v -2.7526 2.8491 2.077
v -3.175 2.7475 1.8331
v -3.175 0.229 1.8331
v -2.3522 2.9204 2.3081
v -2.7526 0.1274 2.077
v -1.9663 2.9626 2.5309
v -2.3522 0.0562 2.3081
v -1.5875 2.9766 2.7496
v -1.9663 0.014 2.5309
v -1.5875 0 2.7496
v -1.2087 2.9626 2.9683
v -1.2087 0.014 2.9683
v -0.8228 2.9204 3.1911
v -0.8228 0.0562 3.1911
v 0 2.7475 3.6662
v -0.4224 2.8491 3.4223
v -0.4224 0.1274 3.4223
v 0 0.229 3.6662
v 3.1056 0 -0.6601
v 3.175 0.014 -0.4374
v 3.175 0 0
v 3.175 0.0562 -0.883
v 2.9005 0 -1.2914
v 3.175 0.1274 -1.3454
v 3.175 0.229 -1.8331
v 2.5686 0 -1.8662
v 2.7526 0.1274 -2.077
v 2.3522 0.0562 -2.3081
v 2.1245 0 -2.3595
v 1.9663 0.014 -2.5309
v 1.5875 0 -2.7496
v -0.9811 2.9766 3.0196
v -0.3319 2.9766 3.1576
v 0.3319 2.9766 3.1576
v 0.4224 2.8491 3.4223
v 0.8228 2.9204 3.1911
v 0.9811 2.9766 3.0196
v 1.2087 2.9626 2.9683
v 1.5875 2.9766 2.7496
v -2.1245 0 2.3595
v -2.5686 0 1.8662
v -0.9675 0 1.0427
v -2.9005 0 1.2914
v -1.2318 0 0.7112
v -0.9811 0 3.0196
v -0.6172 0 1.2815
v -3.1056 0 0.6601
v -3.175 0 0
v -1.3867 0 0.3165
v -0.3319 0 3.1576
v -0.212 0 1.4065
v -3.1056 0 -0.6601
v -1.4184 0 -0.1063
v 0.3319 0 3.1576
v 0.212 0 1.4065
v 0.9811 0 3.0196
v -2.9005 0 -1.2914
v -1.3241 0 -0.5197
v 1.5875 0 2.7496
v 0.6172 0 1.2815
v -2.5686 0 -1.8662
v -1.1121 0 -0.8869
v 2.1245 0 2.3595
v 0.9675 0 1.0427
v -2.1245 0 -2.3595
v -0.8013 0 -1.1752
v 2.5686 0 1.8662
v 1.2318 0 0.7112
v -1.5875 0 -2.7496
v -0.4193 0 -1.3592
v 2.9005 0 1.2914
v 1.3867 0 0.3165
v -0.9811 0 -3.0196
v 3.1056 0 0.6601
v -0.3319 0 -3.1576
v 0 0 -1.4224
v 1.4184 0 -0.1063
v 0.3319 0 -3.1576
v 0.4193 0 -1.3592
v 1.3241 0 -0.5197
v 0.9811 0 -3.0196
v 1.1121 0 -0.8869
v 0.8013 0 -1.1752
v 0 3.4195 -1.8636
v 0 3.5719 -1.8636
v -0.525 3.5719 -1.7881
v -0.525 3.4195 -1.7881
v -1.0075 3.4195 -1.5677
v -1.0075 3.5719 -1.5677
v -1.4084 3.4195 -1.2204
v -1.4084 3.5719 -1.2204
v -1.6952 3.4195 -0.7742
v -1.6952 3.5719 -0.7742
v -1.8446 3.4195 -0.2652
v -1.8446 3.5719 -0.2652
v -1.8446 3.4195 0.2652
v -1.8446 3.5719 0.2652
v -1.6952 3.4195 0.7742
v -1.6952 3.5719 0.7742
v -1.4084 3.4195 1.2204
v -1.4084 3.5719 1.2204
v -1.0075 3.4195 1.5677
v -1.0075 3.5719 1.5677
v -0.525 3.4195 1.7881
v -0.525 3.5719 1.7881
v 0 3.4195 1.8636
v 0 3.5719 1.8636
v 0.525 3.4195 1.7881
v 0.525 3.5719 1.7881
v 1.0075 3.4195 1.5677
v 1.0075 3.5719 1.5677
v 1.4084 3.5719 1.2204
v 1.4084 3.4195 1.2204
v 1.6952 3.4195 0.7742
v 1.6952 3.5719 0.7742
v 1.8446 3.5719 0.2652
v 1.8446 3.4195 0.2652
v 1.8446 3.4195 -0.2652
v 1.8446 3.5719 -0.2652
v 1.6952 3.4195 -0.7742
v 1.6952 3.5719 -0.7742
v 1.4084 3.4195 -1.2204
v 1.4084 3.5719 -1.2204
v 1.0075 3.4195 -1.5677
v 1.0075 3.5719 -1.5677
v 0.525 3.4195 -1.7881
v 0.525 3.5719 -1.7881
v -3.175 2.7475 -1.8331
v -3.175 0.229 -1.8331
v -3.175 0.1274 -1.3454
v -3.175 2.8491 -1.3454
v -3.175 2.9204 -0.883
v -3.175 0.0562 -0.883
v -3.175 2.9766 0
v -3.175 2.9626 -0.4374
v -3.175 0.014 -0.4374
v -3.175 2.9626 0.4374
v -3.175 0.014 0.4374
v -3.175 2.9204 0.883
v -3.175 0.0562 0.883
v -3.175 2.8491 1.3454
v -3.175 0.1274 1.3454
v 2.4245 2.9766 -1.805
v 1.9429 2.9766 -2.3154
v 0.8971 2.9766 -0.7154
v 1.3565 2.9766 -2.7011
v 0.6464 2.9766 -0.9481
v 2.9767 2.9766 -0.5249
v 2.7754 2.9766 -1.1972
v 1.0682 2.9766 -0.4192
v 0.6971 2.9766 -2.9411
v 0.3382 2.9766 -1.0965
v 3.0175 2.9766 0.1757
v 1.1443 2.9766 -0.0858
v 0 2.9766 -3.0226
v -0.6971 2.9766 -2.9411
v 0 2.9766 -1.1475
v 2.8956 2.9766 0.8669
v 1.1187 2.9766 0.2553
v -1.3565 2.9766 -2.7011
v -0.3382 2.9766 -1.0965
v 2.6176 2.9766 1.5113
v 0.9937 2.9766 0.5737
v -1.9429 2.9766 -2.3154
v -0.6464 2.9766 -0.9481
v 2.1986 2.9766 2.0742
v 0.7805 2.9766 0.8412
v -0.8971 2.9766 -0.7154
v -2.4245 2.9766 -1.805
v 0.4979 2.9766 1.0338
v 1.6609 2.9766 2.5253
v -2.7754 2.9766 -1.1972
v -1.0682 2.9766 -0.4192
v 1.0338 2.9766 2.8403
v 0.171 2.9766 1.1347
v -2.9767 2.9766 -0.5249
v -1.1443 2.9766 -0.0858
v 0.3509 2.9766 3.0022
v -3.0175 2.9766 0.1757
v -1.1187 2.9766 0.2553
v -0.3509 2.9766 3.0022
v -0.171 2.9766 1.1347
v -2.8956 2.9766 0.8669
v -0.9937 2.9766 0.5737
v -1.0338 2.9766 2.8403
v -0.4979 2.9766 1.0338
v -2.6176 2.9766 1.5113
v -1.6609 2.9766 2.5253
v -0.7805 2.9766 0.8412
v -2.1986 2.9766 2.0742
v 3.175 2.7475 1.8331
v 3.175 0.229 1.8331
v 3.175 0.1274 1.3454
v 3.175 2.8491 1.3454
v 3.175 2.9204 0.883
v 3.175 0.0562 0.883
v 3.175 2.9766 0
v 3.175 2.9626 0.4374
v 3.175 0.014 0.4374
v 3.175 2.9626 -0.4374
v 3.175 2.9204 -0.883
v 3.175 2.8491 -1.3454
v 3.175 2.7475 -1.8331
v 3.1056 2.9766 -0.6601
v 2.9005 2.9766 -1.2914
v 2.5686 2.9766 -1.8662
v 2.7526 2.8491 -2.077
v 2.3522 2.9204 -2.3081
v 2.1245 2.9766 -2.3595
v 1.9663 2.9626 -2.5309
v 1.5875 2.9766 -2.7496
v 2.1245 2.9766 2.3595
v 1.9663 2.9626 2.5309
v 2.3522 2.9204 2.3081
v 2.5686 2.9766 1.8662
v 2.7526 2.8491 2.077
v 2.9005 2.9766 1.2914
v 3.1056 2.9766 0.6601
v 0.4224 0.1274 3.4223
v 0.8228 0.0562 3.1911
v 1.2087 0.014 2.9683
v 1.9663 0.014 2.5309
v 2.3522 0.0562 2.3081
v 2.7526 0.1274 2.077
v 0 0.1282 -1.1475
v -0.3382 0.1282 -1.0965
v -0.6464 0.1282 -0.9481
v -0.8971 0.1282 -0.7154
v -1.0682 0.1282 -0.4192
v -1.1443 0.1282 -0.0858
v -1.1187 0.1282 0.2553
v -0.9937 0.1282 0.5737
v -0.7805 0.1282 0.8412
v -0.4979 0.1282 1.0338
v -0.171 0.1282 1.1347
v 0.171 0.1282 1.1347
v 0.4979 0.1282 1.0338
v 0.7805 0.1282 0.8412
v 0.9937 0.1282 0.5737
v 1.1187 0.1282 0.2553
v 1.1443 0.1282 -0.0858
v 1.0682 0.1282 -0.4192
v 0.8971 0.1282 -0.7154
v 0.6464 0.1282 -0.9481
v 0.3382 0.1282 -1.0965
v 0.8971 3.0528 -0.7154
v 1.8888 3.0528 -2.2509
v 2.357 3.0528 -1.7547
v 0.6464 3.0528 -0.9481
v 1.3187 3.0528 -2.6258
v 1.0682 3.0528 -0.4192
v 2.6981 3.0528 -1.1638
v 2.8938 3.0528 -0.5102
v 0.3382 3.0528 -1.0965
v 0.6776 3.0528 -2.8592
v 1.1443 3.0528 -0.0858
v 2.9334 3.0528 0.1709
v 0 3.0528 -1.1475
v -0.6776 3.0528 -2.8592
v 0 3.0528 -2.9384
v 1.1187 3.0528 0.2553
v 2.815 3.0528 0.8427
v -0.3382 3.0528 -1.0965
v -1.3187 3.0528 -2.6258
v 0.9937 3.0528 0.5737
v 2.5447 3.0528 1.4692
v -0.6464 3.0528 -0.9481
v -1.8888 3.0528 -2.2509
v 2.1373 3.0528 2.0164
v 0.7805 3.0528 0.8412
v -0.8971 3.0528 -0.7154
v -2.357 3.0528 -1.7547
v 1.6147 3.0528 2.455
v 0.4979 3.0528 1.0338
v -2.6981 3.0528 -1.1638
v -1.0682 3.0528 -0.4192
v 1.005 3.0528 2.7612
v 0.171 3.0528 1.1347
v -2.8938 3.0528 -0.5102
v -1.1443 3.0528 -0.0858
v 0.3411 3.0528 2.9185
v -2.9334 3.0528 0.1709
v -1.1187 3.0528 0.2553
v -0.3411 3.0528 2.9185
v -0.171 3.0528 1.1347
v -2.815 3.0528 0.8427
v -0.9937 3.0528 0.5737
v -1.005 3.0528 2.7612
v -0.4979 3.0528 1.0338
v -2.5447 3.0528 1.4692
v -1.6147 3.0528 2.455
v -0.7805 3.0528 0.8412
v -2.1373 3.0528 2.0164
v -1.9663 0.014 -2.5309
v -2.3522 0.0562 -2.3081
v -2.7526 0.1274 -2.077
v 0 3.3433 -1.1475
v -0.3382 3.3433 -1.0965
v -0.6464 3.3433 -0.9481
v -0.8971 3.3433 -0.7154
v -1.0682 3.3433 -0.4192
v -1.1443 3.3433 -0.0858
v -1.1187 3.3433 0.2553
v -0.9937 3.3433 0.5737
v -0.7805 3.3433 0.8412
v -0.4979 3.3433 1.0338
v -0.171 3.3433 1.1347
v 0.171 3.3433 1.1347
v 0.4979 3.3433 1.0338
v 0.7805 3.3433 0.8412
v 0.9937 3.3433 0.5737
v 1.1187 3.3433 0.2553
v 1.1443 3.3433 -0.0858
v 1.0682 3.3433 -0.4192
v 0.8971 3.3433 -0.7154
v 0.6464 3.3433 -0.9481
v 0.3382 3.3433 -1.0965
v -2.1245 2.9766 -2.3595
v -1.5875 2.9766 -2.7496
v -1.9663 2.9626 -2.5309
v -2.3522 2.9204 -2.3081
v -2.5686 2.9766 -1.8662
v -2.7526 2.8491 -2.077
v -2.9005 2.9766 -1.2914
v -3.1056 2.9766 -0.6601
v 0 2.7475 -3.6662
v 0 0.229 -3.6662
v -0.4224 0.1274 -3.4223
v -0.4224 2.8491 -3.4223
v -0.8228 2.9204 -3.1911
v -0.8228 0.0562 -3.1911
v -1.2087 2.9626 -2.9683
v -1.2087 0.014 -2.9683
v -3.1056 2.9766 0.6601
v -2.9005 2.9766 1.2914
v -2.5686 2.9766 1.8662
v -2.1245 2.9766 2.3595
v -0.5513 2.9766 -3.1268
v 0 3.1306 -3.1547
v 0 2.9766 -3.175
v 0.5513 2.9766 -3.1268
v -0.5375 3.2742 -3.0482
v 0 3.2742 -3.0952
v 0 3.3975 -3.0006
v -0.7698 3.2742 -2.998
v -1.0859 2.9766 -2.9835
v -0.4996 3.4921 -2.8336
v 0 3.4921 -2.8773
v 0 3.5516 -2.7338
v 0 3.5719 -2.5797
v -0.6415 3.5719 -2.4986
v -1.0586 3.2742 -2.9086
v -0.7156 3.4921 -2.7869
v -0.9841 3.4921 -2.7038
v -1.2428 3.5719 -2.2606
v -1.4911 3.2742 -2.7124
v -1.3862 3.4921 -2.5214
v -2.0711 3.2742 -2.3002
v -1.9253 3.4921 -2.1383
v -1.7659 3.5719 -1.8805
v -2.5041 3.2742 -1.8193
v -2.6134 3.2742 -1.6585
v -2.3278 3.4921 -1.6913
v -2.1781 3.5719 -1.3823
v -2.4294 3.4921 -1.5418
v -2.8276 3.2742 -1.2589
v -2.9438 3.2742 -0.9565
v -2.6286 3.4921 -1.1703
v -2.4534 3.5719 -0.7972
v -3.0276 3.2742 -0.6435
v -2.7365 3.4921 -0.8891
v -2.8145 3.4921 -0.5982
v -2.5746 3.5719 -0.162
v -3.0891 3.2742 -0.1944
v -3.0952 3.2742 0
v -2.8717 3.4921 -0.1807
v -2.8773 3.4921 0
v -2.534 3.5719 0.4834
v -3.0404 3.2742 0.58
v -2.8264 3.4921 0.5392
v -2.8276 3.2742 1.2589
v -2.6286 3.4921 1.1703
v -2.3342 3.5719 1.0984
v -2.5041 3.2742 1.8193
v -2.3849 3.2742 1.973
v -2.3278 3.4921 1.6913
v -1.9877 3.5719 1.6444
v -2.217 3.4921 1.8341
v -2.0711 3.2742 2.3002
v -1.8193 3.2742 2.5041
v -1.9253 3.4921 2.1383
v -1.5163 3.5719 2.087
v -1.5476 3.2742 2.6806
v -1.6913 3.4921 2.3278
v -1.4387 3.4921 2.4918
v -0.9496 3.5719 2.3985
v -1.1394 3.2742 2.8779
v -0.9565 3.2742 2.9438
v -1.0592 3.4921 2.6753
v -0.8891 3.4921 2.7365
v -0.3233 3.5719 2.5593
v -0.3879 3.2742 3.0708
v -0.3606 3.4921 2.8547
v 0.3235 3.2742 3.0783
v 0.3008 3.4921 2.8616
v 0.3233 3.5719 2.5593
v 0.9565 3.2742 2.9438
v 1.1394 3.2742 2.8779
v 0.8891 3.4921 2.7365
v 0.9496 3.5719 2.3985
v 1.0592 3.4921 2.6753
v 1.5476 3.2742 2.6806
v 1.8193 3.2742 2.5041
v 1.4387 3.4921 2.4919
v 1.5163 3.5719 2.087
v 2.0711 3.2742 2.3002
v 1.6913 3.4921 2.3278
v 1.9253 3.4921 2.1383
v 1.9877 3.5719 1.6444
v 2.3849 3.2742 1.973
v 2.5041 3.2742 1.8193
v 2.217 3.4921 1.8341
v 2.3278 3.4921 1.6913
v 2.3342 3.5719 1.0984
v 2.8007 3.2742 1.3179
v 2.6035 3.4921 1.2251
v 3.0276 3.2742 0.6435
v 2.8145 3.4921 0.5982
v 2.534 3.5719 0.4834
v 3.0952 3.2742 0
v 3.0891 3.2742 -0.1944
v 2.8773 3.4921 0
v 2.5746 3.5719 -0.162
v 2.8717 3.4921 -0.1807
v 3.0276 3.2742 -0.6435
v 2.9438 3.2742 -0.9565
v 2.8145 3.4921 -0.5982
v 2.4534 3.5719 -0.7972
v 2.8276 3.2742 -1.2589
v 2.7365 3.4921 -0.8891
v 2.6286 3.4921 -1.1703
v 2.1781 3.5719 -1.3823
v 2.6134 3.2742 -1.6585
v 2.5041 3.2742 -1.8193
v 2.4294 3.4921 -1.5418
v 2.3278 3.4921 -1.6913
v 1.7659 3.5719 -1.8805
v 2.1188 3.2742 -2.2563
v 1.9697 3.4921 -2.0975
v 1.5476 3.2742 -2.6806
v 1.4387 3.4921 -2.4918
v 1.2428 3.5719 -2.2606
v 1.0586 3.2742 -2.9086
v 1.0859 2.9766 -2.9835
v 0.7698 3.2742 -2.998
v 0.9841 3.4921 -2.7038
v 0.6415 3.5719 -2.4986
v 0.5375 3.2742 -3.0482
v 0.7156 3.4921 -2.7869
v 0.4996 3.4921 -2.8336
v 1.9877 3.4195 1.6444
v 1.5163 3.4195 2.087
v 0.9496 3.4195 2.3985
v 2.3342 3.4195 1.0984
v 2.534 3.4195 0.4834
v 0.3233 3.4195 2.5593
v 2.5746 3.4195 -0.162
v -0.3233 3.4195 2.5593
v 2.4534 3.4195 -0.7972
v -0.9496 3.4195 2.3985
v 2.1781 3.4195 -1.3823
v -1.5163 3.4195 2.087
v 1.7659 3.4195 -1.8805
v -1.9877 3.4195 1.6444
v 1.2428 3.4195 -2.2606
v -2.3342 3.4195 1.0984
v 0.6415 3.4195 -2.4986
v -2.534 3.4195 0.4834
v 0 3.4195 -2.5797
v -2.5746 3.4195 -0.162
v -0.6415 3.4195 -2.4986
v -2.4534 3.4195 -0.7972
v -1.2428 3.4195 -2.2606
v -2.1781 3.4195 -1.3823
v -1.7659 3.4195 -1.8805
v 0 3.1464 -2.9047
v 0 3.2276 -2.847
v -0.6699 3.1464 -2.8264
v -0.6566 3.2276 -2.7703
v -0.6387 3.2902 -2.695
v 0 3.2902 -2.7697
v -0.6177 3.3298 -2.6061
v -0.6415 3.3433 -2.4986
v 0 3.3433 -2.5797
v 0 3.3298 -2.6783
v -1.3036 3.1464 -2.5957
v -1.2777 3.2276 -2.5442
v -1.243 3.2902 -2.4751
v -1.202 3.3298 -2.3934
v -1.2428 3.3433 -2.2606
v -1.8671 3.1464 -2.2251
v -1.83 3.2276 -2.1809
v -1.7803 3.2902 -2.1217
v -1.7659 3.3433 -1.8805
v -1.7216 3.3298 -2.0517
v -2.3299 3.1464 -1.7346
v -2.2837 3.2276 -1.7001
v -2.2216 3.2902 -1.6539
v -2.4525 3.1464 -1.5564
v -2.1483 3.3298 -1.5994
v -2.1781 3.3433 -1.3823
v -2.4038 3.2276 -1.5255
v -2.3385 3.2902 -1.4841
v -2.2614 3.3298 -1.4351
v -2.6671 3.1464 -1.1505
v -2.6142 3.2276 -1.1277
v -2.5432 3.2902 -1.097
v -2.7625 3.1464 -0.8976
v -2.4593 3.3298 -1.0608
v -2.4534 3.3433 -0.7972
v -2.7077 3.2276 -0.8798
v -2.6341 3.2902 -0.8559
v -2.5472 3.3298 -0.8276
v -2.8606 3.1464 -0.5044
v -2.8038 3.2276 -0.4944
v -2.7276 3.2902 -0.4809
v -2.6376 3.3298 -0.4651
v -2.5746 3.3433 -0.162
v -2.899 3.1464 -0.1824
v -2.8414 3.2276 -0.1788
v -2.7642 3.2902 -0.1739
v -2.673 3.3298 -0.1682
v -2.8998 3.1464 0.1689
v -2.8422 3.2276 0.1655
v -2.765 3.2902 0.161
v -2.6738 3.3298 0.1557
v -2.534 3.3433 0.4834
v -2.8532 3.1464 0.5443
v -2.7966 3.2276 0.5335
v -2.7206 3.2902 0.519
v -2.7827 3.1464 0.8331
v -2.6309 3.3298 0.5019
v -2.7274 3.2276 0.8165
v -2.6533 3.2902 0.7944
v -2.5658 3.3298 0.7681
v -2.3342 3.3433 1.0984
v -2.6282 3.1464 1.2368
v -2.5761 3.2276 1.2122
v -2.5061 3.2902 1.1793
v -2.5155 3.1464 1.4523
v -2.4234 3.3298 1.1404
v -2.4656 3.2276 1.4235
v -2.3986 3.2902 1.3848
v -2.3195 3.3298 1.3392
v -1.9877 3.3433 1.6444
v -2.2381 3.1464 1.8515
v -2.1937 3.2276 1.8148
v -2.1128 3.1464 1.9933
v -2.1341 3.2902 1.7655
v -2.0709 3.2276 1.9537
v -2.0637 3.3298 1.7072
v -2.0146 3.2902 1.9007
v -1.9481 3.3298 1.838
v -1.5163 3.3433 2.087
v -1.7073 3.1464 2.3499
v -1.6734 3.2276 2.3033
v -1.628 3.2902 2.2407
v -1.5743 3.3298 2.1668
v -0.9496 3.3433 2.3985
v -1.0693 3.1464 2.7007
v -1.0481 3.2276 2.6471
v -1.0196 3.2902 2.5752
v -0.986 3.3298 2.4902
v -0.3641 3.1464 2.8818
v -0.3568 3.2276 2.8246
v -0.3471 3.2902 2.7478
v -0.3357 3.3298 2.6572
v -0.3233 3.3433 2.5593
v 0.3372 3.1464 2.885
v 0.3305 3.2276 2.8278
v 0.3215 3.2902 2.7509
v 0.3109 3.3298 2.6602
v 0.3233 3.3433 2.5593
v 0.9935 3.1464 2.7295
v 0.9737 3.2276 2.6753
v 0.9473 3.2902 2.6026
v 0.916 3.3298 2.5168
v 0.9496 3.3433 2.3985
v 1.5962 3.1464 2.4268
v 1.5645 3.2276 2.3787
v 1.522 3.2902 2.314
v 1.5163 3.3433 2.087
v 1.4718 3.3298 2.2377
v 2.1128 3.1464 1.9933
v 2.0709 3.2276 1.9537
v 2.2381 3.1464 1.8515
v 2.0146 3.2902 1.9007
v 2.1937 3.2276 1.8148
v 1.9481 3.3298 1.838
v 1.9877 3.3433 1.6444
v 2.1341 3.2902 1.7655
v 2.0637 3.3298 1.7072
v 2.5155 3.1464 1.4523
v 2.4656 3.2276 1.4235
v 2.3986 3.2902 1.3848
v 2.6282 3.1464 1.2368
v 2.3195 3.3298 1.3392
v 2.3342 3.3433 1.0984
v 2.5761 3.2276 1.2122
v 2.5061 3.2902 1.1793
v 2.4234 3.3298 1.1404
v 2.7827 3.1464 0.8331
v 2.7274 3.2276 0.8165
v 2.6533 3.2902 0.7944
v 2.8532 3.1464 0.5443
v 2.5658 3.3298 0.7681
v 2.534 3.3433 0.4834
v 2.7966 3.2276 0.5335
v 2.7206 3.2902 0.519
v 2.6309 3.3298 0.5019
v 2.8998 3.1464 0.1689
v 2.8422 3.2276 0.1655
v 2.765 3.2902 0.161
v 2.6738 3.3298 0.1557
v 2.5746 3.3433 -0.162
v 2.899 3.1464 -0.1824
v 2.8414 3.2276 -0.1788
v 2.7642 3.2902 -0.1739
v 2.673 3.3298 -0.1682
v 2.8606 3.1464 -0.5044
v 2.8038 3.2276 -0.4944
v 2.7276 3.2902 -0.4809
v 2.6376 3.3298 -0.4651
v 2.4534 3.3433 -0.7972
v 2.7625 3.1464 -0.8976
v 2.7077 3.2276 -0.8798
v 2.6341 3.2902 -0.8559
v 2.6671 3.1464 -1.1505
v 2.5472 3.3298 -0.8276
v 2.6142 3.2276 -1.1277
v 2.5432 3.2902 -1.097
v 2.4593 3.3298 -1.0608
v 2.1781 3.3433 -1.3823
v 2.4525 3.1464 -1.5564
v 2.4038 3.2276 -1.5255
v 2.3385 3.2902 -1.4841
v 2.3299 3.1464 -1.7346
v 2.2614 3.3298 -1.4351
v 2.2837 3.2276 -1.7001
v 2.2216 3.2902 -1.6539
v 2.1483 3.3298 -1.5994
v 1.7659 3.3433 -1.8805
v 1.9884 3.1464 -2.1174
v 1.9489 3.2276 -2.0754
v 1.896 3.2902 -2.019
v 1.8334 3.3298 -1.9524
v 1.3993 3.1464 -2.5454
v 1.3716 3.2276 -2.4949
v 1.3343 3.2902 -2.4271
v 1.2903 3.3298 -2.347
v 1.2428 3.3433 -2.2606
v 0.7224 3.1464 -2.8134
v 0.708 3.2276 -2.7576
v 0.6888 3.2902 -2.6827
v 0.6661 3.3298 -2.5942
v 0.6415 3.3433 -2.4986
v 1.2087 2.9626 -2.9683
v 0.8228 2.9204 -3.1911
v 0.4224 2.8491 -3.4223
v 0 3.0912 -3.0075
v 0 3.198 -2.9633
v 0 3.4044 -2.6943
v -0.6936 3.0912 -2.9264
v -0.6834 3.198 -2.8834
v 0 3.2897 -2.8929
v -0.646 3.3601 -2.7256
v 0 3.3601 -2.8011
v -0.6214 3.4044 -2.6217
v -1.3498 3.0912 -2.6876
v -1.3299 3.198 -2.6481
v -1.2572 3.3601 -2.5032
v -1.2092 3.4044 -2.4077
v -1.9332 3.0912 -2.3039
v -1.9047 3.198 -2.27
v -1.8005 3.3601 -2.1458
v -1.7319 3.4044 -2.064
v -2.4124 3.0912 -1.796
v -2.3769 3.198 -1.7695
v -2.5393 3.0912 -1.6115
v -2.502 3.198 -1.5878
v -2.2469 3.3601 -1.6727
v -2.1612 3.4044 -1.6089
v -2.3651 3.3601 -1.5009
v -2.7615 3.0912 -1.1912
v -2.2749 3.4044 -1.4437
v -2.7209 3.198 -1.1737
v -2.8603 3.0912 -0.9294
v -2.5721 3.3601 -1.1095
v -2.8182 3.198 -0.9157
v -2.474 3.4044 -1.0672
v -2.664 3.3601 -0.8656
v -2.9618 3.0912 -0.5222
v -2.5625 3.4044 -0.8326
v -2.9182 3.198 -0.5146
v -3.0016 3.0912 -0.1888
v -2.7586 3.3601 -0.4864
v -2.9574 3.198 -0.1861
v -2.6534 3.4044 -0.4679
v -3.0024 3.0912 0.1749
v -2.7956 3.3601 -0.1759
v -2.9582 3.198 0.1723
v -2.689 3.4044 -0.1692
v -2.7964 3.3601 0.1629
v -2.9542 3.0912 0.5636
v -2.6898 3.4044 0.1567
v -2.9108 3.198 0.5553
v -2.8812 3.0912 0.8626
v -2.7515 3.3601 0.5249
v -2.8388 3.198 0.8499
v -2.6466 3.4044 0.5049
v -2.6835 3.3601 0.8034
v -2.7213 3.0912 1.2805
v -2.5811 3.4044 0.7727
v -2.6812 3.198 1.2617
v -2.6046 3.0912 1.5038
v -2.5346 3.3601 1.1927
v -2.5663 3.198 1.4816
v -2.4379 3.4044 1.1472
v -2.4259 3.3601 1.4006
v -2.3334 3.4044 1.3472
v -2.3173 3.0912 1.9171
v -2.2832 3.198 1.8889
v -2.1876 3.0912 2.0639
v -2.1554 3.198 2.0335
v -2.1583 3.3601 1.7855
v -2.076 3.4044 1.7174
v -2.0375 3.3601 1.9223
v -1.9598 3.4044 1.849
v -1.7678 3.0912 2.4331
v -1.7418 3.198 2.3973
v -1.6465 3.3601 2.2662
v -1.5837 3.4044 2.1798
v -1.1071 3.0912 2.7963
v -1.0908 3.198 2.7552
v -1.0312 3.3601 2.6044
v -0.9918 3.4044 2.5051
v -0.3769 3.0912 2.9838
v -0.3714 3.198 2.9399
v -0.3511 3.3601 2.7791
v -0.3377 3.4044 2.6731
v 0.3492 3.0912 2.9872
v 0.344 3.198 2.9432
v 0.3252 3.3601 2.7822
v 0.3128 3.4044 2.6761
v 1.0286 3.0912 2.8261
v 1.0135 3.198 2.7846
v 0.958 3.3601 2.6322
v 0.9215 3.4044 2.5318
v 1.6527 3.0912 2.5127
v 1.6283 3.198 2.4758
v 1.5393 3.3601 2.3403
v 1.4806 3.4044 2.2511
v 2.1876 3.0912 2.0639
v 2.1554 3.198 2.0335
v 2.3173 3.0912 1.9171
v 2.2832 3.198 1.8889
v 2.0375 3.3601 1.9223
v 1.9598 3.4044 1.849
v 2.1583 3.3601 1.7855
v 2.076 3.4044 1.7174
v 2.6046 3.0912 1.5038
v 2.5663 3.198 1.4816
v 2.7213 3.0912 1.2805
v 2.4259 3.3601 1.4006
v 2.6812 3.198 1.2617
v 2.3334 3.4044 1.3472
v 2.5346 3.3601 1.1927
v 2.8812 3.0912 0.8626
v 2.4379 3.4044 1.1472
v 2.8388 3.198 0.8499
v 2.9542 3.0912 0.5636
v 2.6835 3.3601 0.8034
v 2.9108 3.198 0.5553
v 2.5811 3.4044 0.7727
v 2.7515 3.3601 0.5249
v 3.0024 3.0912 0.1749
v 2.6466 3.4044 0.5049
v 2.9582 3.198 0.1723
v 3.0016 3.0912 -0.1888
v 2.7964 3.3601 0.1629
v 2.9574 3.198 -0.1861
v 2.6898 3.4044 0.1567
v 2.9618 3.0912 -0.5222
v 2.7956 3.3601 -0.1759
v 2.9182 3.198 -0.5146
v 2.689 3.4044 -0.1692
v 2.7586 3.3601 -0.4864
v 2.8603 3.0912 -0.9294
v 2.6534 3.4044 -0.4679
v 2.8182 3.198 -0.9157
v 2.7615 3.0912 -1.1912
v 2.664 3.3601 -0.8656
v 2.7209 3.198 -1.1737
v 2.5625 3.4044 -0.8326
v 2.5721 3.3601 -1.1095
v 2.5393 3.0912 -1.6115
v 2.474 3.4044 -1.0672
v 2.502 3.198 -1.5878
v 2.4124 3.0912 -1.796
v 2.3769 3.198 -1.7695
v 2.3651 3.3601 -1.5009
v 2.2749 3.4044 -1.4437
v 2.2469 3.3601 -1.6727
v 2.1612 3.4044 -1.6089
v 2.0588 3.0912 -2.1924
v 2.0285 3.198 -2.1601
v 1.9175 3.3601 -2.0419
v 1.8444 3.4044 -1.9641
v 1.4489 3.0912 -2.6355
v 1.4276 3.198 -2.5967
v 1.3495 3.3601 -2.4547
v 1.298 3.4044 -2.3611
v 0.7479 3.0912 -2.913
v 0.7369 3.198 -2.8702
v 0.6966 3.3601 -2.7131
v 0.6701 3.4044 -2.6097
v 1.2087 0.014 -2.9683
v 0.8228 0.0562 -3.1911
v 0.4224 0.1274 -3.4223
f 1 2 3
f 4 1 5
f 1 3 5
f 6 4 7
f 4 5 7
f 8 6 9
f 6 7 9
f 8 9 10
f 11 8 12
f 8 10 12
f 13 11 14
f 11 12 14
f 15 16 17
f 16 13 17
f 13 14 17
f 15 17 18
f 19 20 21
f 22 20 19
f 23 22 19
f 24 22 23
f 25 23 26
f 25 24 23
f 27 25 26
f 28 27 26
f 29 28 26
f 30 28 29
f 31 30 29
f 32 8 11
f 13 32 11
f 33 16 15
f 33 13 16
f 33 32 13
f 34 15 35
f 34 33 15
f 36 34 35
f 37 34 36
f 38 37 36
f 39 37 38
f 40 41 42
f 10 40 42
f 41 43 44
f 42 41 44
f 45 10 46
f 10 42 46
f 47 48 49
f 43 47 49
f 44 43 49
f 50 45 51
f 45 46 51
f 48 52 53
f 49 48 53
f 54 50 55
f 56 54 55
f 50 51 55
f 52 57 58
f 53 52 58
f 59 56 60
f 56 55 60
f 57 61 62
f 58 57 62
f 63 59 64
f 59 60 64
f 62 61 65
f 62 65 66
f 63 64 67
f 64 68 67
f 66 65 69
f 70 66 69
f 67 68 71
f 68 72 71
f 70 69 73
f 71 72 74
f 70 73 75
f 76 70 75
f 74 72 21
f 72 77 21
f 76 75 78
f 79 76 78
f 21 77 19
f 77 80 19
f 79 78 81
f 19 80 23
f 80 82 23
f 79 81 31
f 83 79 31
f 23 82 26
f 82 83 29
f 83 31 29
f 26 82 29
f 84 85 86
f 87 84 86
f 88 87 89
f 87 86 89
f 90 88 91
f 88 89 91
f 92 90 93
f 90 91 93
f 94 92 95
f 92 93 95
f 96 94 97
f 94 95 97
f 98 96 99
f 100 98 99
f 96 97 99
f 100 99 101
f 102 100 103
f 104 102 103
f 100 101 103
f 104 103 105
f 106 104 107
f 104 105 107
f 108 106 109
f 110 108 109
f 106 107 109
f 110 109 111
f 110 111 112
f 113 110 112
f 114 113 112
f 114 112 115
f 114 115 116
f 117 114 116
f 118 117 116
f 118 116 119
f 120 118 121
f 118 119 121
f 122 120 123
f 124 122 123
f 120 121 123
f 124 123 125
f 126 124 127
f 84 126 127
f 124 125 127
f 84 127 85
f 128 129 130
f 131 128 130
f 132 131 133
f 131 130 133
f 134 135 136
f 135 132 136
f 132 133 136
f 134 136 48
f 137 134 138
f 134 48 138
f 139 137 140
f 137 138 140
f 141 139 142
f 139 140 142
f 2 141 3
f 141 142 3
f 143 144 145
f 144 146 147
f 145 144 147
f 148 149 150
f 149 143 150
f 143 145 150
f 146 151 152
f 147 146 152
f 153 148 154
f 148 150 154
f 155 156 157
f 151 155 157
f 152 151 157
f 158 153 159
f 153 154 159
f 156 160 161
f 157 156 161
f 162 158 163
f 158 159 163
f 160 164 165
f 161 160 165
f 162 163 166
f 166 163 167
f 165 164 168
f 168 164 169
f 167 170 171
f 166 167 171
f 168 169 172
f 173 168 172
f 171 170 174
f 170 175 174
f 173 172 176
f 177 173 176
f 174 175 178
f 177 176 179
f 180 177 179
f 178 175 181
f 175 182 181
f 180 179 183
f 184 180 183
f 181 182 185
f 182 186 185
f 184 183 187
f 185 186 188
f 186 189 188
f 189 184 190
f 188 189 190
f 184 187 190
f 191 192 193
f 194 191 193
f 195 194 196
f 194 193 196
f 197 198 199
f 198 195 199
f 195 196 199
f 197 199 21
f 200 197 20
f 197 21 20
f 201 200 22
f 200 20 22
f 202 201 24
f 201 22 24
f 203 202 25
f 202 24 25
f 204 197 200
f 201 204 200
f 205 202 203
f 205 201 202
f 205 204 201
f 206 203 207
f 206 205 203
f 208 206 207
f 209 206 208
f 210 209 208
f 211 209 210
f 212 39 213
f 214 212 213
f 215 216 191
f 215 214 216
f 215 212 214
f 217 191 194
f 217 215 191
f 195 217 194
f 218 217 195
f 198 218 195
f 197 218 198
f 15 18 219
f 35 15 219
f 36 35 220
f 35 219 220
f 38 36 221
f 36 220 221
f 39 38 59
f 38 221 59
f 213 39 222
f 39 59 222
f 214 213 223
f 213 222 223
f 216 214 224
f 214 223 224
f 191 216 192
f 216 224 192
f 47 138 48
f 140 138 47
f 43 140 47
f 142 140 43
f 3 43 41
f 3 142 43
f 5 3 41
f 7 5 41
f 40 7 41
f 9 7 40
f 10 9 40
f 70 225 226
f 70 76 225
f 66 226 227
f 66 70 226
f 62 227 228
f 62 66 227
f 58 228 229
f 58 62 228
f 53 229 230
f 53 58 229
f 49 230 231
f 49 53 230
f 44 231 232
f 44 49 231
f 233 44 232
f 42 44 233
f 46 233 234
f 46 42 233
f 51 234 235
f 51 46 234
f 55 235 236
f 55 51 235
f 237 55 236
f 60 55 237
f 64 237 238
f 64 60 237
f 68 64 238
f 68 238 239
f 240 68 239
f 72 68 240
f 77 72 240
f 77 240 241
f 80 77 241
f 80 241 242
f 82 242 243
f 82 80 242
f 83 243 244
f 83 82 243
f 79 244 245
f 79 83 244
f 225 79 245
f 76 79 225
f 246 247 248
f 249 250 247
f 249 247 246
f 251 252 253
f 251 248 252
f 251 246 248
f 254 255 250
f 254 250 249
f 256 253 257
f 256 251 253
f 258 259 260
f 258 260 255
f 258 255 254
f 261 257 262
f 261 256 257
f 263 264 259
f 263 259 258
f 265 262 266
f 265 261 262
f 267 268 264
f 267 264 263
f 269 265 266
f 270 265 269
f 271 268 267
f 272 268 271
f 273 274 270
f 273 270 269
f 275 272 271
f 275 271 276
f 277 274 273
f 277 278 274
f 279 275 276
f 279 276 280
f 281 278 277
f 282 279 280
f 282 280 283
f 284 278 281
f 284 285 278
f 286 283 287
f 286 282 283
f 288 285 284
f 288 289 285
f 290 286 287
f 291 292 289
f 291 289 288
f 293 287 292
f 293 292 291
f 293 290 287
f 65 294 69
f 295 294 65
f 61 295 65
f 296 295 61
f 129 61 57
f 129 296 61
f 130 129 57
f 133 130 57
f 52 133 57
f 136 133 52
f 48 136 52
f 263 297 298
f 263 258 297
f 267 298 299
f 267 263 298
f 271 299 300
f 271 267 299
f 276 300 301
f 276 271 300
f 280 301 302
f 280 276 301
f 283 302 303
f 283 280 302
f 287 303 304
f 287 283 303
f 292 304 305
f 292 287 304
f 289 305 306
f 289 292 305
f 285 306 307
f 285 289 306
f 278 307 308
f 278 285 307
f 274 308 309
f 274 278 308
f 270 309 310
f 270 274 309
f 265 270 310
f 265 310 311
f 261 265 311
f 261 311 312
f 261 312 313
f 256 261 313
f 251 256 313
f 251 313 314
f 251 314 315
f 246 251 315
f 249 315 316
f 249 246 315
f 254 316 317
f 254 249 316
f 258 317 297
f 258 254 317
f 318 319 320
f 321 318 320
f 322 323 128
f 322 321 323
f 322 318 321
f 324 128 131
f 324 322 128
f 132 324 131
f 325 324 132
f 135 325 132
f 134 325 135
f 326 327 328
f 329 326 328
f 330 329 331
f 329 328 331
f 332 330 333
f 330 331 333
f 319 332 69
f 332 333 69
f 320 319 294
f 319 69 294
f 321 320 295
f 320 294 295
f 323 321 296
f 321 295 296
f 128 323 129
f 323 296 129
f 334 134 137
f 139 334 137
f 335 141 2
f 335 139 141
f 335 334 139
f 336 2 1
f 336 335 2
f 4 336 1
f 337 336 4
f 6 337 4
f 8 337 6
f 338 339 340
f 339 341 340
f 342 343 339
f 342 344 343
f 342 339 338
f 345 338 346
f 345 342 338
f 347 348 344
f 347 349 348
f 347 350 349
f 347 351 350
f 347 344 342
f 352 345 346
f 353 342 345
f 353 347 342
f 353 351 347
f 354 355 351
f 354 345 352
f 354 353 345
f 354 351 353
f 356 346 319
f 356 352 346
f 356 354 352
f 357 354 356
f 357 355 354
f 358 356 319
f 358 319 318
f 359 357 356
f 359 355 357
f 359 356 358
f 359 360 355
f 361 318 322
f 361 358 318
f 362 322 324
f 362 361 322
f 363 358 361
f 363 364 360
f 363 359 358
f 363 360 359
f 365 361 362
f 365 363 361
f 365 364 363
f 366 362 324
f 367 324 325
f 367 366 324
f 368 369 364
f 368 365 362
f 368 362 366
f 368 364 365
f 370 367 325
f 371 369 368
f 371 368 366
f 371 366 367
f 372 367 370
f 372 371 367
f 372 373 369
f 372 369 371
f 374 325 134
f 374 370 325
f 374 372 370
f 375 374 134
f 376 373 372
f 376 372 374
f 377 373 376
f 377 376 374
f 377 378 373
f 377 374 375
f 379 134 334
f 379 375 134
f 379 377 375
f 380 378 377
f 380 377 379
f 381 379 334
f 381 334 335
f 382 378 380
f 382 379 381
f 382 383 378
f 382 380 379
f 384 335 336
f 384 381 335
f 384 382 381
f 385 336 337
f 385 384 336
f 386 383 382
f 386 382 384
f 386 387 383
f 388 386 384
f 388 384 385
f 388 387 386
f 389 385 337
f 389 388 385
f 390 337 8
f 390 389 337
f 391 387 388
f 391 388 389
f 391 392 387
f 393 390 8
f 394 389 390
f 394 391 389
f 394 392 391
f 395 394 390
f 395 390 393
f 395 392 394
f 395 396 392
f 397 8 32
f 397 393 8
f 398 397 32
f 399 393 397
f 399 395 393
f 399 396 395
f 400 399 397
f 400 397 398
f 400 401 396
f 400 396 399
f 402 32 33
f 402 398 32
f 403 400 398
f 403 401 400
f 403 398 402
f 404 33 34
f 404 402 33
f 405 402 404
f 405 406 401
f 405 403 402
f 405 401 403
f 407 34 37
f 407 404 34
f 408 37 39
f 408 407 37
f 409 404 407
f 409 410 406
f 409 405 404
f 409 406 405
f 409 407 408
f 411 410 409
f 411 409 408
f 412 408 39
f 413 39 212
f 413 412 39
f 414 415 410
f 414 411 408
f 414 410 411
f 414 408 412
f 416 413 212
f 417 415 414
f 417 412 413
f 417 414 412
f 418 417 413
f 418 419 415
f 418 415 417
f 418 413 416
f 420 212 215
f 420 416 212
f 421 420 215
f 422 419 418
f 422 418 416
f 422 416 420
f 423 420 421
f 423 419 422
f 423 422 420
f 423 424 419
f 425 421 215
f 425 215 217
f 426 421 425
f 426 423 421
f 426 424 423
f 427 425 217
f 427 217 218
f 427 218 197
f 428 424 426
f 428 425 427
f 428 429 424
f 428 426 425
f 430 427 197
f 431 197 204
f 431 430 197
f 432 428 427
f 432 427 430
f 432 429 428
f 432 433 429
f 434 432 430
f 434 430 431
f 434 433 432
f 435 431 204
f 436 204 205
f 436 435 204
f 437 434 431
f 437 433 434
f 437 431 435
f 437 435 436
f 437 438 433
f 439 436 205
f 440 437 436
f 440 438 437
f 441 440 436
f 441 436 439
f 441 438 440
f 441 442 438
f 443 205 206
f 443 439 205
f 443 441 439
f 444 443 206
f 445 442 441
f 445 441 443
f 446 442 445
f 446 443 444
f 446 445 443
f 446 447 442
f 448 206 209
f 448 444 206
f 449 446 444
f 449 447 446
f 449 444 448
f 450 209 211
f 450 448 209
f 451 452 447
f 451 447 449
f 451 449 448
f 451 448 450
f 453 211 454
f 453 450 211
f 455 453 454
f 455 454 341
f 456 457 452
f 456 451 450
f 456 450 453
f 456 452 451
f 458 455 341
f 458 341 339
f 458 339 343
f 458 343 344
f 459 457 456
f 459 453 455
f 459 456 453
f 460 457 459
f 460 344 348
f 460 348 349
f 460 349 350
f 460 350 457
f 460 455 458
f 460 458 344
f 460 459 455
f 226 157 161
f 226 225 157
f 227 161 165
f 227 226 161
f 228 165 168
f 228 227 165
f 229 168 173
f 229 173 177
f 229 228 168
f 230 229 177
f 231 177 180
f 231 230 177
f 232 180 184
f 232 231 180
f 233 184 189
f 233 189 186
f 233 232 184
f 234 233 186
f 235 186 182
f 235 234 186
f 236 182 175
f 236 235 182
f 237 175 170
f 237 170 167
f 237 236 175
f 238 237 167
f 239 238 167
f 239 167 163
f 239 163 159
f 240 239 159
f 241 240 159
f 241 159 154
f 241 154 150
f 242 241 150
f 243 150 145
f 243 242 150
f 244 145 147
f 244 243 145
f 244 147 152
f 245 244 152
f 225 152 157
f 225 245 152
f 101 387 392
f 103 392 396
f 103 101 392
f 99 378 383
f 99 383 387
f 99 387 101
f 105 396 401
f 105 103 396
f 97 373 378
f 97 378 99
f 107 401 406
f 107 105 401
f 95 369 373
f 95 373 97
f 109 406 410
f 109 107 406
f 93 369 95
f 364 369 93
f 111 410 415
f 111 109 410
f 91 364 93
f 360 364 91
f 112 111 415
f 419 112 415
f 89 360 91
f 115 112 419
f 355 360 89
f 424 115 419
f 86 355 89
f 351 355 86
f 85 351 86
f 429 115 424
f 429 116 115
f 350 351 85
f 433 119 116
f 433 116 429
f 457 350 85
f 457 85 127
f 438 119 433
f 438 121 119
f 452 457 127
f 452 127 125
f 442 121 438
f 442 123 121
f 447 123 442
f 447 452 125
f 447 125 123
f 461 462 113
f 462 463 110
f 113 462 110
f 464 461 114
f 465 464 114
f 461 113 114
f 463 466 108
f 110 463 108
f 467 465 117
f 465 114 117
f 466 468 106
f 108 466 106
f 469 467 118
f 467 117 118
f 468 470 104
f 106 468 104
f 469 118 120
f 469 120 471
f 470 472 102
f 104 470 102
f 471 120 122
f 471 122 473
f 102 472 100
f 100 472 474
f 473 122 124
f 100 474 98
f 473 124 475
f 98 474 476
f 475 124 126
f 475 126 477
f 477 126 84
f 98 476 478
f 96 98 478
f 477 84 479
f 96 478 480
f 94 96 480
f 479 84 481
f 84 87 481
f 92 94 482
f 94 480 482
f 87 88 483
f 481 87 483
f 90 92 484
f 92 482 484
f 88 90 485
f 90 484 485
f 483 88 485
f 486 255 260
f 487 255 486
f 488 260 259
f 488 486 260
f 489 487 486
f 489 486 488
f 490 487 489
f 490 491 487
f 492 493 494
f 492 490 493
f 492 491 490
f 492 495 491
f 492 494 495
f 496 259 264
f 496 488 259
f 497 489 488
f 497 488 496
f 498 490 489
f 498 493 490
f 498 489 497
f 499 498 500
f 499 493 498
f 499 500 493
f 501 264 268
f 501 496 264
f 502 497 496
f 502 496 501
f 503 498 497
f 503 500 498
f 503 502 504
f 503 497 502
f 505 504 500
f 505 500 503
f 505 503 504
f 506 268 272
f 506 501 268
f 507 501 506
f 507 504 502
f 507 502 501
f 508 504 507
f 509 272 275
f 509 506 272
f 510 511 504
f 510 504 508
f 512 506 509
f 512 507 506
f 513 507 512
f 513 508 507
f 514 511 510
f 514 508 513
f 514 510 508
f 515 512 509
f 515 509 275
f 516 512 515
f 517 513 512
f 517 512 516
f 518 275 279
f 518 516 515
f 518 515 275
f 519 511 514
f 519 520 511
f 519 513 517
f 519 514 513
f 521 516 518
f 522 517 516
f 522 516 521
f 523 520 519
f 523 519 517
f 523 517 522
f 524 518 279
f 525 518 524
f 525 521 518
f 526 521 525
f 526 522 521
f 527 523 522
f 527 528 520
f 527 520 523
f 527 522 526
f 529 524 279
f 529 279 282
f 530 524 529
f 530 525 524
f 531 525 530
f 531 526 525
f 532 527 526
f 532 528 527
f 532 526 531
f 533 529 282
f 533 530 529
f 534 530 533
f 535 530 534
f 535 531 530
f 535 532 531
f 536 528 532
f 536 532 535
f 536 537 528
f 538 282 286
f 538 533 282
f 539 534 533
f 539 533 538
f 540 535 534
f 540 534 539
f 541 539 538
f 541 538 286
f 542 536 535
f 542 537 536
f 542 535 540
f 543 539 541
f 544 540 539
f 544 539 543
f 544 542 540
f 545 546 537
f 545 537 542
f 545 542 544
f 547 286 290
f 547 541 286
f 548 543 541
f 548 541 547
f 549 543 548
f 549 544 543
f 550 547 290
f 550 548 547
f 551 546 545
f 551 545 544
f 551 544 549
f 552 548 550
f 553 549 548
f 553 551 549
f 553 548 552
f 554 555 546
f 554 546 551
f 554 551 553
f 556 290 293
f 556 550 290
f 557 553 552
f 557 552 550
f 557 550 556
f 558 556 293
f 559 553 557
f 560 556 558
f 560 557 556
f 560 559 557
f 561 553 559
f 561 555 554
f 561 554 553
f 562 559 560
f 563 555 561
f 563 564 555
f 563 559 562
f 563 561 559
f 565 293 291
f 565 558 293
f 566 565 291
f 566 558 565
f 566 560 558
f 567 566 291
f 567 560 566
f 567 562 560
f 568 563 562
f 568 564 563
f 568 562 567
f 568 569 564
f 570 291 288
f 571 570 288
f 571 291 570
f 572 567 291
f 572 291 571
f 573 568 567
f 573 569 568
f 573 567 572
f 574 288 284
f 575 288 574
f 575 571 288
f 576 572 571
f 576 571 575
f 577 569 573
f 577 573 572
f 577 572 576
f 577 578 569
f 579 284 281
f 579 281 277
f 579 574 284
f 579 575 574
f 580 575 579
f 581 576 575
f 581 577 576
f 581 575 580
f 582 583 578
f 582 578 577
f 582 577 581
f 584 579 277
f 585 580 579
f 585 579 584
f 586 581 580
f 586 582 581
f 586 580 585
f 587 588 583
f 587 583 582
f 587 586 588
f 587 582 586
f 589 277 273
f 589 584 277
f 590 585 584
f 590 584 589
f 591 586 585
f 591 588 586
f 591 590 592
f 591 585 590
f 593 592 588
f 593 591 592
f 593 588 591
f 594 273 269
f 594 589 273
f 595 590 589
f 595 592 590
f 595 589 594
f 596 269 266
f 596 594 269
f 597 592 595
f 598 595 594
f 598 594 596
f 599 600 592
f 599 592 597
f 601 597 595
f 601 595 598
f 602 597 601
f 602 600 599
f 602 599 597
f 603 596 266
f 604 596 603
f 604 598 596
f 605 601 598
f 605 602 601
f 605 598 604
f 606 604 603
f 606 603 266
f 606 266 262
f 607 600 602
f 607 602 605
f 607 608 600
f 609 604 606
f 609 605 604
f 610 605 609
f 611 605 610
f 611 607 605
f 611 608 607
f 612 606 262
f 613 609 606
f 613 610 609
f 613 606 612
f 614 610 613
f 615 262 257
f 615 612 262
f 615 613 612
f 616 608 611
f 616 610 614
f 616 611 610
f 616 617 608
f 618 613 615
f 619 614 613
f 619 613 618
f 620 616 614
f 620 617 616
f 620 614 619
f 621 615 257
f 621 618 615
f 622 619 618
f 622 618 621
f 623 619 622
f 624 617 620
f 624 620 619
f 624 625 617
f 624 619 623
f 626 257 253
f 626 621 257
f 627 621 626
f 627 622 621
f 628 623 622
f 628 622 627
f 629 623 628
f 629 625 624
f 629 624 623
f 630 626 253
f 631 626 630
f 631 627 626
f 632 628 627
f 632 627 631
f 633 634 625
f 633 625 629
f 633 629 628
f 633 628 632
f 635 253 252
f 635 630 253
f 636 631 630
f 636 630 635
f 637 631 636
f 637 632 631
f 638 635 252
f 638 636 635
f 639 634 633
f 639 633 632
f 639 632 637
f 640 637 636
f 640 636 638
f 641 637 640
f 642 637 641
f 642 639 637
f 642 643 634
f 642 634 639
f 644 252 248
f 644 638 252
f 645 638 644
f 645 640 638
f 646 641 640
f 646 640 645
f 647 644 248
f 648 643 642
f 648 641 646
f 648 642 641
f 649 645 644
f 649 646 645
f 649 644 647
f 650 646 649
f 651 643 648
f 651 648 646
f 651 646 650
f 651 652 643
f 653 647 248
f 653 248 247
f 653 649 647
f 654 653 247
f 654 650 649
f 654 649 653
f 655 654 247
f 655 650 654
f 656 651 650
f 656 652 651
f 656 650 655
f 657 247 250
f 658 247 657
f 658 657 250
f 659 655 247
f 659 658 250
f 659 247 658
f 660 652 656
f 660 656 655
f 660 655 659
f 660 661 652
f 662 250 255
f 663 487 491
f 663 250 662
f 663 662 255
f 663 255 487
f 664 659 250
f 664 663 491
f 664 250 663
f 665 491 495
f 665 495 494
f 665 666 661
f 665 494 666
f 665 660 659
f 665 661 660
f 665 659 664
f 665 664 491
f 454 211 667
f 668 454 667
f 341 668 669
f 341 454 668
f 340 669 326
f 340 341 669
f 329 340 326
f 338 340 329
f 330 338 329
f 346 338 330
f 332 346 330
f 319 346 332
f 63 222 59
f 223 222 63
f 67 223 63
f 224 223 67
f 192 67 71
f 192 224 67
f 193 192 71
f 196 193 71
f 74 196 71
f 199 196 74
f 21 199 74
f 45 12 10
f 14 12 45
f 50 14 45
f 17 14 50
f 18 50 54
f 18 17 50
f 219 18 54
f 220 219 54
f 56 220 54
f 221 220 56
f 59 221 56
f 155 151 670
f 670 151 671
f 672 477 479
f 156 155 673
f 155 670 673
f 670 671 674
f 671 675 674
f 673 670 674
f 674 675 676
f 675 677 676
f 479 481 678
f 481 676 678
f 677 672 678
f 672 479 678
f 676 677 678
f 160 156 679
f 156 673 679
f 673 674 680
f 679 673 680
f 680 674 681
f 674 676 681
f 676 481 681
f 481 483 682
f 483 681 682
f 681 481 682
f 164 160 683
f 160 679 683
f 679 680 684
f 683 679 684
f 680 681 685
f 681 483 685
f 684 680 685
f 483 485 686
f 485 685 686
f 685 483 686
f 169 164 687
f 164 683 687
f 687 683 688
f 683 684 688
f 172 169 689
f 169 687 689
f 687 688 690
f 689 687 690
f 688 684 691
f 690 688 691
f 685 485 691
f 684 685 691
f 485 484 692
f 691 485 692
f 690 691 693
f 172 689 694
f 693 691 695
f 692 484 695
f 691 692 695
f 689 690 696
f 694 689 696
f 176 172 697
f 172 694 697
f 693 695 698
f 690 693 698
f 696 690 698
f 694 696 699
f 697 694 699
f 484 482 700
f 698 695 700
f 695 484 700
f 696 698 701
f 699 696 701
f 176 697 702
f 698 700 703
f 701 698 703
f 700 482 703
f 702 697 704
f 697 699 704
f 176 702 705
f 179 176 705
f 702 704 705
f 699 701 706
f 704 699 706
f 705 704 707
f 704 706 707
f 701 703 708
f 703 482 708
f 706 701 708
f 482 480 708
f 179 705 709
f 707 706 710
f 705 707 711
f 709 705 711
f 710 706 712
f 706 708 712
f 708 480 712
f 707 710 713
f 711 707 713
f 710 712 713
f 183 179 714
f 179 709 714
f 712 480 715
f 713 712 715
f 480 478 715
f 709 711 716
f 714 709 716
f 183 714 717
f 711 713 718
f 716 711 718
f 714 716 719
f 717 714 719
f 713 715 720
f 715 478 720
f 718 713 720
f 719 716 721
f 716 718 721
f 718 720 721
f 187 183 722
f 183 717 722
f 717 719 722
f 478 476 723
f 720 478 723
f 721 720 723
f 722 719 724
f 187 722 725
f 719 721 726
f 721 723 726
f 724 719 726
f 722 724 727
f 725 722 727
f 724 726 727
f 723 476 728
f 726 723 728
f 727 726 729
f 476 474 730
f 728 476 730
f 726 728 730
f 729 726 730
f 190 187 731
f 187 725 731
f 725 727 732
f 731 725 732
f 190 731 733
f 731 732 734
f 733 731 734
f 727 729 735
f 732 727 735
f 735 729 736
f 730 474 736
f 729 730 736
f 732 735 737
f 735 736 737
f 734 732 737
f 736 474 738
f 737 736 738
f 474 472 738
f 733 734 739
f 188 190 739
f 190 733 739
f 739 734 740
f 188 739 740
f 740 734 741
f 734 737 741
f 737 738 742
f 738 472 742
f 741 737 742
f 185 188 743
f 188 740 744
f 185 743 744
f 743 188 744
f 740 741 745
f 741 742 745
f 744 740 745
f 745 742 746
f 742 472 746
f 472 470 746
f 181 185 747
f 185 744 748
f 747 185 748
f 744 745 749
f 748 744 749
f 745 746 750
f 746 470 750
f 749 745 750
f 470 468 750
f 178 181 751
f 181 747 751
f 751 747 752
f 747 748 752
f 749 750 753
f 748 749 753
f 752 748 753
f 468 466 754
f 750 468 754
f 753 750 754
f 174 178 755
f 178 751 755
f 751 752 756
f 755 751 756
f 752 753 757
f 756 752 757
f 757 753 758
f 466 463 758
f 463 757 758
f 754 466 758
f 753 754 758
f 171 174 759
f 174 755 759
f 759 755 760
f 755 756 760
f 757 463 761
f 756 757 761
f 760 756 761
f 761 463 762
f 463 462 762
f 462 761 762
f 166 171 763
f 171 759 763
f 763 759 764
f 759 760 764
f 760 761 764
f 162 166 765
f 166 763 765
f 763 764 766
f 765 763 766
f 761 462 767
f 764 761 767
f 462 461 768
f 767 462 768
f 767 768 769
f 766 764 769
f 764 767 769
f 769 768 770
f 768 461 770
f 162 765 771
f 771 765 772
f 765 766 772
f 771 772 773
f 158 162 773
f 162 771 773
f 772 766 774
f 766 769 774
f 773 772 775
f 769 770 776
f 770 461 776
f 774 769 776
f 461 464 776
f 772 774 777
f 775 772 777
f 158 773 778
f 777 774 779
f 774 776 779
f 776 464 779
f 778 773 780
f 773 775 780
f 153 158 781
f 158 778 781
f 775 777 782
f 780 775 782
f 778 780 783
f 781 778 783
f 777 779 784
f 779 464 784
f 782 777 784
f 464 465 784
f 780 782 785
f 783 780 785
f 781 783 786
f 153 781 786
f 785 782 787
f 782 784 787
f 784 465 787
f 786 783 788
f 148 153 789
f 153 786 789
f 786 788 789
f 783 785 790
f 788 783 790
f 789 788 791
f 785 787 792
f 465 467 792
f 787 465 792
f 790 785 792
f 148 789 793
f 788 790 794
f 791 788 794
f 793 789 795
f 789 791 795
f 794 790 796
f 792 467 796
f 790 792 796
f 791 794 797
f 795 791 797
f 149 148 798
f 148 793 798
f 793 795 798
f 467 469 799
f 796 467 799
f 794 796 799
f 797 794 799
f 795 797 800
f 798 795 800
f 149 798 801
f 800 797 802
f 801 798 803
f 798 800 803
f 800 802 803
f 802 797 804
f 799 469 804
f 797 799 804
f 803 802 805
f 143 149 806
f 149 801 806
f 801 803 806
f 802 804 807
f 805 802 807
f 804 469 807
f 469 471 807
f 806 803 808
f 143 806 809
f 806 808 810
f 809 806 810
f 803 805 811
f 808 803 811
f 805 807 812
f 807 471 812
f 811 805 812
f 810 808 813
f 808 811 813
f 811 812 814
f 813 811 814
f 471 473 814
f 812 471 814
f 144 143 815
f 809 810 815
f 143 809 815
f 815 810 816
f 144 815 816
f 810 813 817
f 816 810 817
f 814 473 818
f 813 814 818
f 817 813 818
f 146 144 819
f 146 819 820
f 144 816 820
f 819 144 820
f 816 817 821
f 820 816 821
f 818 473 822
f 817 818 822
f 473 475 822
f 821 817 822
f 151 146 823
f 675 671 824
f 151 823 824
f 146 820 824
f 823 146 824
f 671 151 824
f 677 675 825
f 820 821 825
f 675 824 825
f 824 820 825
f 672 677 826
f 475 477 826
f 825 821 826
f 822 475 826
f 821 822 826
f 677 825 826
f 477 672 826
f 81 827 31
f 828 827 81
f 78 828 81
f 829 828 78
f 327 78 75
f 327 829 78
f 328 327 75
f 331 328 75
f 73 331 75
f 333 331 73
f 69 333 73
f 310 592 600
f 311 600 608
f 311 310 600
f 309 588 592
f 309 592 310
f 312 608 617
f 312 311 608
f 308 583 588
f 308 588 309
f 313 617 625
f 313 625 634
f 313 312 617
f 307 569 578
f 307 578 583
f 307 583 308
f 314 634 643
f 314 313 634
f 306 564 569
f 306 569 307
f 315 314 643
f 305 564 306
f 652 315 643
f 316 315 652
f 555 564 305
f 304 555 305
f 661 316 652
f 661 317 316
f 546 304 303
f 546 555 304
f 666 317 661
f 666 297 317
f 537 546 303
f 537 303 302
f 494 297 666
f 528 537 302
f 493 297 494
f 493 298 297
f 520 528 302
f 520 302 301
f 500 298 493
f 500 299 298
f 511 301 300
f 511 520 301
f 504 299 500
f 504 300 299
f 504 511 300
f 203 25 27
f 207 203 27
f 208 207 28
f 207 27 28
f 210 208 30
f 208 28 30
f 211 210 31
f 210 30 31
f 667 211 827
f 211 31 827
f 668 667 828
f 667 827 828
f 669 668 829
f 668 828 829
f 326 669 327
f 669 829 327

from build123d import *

# Parameters (mm, degrees)
EXTRUDE1_DEPTH = 3.571875


with BuildPart() as part:
    # Sketch1 → Extrude1 (new body)
    with BuildSketch(Plane(origin=(0, 0, 0), x_dir=(1, 0, 0), z_dir=(0, 1, 0))):
        Polygon((0, 3.666174209), (-3.175, 1.833087105), (-3.175, -1.833087105), (0, -3.666174209), (3.175, -1.833087105), (3.175, 1.833087105), align=None)
    extrude(amount=EXTRUDE1_DEPTH)

    # Sketch4 → Cut-Revolve2 (revolve, cut)
    with BuildSketch(Plane(origin=(0, 0, 0), x_dir=(0, 0, -1), z_dir=(1, 0, 0))):
        Polygon((0, 3.571875), (1.4224, 3.571875), (1.147473702, 3.443674762), (1.147473702, 0.128200238), (1.4224, 0), (0, 0), align=None)
    revolve(axis=Axis((0, 3.571875, 0), (0, 1, 0)), mode=Mode.SUBTRACT)

    # Sketch5 → Cut-Revolve3 (revolve, cut)
    with BuildSketch(Plane(origin=(0, 0, 0), x_dir=(0, 0, -1), z_dir=(1, 0, 0))):
        with BuildLine():
            Line((0, 0), (3.175, 0))
            Line((3.175, 0), (3.666174209, 0.229038295))
            Line((3.666174209, 0.229038295), (3.666174209, 2.747524205))
            Line((3.666174209, 2.747524205), (3.175, 2.9765625))
            ThreePointArc((3.175, 2.9765625), (3.000637006, 3.397512006), (2.5796875, 3.571875))
            Line((2.5796875, 3.571875), (2.5796875, 4.841875))
            Line((2.5796875, 4.841875), (4.936174209, 4.841875))
            Line((4.936174209, 4.841875), (4.936174209, -1.27))
            Line((4.936174209, -1.27), (0, -1.27))
            Line((0, -1.27), (0, 0))
        make_face()
    revolve(axis=Axis((0, 0, 0), (0, 1, 0)), mode=Mode.SUBTRACT)

    # Sketch6 → Cut-Revolve4 (revolve, cut)
    with BuildSketch(Plane(origin=(0, 0, 0), x_dir=(0, 0, -1), z_dir=(1, 0, 0))):
        with BuildLine():
            Line((1.147473702, 2.9765625), (3.0226, 2.9765625))
            ThreePointArc((3.0226, 2.9765625), (2.892873932, 3.289748932), (2.5796875, 3.419475))
            Line((2.5796875, 3.419475), (1.863580601, 3.419475))
            Line((1.863580601, 3.419475), (1.863580601, 4.841875))
            Line((1.863580601, 4.841875), (1.147473702, 4.841875))
            Line((1.147473702, 4.841875), (1.147473702, 2.9765625))
        make_face()
    revolve(axis=Axis((0, 0, 0), (0, 1, 0)), mode=Mode.SUBTRACT)


with BuildPart() as body_2:
    # Sketch7 → Revolve2 (revolve)
    with BuildSketch(Plane(origin=(0, 0, 0), x_dir=(0, 0, -1), z_dir=(1, 0, 0))):
        with BuildLine():
            Line((1.147473702, 3.0527625), (2.938395763, 3.0527625))
            ThreePointArc((2.938395763, 3.0527625), (2.810484559, 3.261537543), (2.5796875, 3.343275))
            Line((2.5796875, 3.343275), (1.147473702, 3.343275))
            Line((1.147473702, 3.343275), (1.147473702, 3.0527625))
        make_face()
    revolve(axis=Axis((0, 3.0527625, 0), (0, 1, 0)))


solid = Compound([part.part, body_2.part])
